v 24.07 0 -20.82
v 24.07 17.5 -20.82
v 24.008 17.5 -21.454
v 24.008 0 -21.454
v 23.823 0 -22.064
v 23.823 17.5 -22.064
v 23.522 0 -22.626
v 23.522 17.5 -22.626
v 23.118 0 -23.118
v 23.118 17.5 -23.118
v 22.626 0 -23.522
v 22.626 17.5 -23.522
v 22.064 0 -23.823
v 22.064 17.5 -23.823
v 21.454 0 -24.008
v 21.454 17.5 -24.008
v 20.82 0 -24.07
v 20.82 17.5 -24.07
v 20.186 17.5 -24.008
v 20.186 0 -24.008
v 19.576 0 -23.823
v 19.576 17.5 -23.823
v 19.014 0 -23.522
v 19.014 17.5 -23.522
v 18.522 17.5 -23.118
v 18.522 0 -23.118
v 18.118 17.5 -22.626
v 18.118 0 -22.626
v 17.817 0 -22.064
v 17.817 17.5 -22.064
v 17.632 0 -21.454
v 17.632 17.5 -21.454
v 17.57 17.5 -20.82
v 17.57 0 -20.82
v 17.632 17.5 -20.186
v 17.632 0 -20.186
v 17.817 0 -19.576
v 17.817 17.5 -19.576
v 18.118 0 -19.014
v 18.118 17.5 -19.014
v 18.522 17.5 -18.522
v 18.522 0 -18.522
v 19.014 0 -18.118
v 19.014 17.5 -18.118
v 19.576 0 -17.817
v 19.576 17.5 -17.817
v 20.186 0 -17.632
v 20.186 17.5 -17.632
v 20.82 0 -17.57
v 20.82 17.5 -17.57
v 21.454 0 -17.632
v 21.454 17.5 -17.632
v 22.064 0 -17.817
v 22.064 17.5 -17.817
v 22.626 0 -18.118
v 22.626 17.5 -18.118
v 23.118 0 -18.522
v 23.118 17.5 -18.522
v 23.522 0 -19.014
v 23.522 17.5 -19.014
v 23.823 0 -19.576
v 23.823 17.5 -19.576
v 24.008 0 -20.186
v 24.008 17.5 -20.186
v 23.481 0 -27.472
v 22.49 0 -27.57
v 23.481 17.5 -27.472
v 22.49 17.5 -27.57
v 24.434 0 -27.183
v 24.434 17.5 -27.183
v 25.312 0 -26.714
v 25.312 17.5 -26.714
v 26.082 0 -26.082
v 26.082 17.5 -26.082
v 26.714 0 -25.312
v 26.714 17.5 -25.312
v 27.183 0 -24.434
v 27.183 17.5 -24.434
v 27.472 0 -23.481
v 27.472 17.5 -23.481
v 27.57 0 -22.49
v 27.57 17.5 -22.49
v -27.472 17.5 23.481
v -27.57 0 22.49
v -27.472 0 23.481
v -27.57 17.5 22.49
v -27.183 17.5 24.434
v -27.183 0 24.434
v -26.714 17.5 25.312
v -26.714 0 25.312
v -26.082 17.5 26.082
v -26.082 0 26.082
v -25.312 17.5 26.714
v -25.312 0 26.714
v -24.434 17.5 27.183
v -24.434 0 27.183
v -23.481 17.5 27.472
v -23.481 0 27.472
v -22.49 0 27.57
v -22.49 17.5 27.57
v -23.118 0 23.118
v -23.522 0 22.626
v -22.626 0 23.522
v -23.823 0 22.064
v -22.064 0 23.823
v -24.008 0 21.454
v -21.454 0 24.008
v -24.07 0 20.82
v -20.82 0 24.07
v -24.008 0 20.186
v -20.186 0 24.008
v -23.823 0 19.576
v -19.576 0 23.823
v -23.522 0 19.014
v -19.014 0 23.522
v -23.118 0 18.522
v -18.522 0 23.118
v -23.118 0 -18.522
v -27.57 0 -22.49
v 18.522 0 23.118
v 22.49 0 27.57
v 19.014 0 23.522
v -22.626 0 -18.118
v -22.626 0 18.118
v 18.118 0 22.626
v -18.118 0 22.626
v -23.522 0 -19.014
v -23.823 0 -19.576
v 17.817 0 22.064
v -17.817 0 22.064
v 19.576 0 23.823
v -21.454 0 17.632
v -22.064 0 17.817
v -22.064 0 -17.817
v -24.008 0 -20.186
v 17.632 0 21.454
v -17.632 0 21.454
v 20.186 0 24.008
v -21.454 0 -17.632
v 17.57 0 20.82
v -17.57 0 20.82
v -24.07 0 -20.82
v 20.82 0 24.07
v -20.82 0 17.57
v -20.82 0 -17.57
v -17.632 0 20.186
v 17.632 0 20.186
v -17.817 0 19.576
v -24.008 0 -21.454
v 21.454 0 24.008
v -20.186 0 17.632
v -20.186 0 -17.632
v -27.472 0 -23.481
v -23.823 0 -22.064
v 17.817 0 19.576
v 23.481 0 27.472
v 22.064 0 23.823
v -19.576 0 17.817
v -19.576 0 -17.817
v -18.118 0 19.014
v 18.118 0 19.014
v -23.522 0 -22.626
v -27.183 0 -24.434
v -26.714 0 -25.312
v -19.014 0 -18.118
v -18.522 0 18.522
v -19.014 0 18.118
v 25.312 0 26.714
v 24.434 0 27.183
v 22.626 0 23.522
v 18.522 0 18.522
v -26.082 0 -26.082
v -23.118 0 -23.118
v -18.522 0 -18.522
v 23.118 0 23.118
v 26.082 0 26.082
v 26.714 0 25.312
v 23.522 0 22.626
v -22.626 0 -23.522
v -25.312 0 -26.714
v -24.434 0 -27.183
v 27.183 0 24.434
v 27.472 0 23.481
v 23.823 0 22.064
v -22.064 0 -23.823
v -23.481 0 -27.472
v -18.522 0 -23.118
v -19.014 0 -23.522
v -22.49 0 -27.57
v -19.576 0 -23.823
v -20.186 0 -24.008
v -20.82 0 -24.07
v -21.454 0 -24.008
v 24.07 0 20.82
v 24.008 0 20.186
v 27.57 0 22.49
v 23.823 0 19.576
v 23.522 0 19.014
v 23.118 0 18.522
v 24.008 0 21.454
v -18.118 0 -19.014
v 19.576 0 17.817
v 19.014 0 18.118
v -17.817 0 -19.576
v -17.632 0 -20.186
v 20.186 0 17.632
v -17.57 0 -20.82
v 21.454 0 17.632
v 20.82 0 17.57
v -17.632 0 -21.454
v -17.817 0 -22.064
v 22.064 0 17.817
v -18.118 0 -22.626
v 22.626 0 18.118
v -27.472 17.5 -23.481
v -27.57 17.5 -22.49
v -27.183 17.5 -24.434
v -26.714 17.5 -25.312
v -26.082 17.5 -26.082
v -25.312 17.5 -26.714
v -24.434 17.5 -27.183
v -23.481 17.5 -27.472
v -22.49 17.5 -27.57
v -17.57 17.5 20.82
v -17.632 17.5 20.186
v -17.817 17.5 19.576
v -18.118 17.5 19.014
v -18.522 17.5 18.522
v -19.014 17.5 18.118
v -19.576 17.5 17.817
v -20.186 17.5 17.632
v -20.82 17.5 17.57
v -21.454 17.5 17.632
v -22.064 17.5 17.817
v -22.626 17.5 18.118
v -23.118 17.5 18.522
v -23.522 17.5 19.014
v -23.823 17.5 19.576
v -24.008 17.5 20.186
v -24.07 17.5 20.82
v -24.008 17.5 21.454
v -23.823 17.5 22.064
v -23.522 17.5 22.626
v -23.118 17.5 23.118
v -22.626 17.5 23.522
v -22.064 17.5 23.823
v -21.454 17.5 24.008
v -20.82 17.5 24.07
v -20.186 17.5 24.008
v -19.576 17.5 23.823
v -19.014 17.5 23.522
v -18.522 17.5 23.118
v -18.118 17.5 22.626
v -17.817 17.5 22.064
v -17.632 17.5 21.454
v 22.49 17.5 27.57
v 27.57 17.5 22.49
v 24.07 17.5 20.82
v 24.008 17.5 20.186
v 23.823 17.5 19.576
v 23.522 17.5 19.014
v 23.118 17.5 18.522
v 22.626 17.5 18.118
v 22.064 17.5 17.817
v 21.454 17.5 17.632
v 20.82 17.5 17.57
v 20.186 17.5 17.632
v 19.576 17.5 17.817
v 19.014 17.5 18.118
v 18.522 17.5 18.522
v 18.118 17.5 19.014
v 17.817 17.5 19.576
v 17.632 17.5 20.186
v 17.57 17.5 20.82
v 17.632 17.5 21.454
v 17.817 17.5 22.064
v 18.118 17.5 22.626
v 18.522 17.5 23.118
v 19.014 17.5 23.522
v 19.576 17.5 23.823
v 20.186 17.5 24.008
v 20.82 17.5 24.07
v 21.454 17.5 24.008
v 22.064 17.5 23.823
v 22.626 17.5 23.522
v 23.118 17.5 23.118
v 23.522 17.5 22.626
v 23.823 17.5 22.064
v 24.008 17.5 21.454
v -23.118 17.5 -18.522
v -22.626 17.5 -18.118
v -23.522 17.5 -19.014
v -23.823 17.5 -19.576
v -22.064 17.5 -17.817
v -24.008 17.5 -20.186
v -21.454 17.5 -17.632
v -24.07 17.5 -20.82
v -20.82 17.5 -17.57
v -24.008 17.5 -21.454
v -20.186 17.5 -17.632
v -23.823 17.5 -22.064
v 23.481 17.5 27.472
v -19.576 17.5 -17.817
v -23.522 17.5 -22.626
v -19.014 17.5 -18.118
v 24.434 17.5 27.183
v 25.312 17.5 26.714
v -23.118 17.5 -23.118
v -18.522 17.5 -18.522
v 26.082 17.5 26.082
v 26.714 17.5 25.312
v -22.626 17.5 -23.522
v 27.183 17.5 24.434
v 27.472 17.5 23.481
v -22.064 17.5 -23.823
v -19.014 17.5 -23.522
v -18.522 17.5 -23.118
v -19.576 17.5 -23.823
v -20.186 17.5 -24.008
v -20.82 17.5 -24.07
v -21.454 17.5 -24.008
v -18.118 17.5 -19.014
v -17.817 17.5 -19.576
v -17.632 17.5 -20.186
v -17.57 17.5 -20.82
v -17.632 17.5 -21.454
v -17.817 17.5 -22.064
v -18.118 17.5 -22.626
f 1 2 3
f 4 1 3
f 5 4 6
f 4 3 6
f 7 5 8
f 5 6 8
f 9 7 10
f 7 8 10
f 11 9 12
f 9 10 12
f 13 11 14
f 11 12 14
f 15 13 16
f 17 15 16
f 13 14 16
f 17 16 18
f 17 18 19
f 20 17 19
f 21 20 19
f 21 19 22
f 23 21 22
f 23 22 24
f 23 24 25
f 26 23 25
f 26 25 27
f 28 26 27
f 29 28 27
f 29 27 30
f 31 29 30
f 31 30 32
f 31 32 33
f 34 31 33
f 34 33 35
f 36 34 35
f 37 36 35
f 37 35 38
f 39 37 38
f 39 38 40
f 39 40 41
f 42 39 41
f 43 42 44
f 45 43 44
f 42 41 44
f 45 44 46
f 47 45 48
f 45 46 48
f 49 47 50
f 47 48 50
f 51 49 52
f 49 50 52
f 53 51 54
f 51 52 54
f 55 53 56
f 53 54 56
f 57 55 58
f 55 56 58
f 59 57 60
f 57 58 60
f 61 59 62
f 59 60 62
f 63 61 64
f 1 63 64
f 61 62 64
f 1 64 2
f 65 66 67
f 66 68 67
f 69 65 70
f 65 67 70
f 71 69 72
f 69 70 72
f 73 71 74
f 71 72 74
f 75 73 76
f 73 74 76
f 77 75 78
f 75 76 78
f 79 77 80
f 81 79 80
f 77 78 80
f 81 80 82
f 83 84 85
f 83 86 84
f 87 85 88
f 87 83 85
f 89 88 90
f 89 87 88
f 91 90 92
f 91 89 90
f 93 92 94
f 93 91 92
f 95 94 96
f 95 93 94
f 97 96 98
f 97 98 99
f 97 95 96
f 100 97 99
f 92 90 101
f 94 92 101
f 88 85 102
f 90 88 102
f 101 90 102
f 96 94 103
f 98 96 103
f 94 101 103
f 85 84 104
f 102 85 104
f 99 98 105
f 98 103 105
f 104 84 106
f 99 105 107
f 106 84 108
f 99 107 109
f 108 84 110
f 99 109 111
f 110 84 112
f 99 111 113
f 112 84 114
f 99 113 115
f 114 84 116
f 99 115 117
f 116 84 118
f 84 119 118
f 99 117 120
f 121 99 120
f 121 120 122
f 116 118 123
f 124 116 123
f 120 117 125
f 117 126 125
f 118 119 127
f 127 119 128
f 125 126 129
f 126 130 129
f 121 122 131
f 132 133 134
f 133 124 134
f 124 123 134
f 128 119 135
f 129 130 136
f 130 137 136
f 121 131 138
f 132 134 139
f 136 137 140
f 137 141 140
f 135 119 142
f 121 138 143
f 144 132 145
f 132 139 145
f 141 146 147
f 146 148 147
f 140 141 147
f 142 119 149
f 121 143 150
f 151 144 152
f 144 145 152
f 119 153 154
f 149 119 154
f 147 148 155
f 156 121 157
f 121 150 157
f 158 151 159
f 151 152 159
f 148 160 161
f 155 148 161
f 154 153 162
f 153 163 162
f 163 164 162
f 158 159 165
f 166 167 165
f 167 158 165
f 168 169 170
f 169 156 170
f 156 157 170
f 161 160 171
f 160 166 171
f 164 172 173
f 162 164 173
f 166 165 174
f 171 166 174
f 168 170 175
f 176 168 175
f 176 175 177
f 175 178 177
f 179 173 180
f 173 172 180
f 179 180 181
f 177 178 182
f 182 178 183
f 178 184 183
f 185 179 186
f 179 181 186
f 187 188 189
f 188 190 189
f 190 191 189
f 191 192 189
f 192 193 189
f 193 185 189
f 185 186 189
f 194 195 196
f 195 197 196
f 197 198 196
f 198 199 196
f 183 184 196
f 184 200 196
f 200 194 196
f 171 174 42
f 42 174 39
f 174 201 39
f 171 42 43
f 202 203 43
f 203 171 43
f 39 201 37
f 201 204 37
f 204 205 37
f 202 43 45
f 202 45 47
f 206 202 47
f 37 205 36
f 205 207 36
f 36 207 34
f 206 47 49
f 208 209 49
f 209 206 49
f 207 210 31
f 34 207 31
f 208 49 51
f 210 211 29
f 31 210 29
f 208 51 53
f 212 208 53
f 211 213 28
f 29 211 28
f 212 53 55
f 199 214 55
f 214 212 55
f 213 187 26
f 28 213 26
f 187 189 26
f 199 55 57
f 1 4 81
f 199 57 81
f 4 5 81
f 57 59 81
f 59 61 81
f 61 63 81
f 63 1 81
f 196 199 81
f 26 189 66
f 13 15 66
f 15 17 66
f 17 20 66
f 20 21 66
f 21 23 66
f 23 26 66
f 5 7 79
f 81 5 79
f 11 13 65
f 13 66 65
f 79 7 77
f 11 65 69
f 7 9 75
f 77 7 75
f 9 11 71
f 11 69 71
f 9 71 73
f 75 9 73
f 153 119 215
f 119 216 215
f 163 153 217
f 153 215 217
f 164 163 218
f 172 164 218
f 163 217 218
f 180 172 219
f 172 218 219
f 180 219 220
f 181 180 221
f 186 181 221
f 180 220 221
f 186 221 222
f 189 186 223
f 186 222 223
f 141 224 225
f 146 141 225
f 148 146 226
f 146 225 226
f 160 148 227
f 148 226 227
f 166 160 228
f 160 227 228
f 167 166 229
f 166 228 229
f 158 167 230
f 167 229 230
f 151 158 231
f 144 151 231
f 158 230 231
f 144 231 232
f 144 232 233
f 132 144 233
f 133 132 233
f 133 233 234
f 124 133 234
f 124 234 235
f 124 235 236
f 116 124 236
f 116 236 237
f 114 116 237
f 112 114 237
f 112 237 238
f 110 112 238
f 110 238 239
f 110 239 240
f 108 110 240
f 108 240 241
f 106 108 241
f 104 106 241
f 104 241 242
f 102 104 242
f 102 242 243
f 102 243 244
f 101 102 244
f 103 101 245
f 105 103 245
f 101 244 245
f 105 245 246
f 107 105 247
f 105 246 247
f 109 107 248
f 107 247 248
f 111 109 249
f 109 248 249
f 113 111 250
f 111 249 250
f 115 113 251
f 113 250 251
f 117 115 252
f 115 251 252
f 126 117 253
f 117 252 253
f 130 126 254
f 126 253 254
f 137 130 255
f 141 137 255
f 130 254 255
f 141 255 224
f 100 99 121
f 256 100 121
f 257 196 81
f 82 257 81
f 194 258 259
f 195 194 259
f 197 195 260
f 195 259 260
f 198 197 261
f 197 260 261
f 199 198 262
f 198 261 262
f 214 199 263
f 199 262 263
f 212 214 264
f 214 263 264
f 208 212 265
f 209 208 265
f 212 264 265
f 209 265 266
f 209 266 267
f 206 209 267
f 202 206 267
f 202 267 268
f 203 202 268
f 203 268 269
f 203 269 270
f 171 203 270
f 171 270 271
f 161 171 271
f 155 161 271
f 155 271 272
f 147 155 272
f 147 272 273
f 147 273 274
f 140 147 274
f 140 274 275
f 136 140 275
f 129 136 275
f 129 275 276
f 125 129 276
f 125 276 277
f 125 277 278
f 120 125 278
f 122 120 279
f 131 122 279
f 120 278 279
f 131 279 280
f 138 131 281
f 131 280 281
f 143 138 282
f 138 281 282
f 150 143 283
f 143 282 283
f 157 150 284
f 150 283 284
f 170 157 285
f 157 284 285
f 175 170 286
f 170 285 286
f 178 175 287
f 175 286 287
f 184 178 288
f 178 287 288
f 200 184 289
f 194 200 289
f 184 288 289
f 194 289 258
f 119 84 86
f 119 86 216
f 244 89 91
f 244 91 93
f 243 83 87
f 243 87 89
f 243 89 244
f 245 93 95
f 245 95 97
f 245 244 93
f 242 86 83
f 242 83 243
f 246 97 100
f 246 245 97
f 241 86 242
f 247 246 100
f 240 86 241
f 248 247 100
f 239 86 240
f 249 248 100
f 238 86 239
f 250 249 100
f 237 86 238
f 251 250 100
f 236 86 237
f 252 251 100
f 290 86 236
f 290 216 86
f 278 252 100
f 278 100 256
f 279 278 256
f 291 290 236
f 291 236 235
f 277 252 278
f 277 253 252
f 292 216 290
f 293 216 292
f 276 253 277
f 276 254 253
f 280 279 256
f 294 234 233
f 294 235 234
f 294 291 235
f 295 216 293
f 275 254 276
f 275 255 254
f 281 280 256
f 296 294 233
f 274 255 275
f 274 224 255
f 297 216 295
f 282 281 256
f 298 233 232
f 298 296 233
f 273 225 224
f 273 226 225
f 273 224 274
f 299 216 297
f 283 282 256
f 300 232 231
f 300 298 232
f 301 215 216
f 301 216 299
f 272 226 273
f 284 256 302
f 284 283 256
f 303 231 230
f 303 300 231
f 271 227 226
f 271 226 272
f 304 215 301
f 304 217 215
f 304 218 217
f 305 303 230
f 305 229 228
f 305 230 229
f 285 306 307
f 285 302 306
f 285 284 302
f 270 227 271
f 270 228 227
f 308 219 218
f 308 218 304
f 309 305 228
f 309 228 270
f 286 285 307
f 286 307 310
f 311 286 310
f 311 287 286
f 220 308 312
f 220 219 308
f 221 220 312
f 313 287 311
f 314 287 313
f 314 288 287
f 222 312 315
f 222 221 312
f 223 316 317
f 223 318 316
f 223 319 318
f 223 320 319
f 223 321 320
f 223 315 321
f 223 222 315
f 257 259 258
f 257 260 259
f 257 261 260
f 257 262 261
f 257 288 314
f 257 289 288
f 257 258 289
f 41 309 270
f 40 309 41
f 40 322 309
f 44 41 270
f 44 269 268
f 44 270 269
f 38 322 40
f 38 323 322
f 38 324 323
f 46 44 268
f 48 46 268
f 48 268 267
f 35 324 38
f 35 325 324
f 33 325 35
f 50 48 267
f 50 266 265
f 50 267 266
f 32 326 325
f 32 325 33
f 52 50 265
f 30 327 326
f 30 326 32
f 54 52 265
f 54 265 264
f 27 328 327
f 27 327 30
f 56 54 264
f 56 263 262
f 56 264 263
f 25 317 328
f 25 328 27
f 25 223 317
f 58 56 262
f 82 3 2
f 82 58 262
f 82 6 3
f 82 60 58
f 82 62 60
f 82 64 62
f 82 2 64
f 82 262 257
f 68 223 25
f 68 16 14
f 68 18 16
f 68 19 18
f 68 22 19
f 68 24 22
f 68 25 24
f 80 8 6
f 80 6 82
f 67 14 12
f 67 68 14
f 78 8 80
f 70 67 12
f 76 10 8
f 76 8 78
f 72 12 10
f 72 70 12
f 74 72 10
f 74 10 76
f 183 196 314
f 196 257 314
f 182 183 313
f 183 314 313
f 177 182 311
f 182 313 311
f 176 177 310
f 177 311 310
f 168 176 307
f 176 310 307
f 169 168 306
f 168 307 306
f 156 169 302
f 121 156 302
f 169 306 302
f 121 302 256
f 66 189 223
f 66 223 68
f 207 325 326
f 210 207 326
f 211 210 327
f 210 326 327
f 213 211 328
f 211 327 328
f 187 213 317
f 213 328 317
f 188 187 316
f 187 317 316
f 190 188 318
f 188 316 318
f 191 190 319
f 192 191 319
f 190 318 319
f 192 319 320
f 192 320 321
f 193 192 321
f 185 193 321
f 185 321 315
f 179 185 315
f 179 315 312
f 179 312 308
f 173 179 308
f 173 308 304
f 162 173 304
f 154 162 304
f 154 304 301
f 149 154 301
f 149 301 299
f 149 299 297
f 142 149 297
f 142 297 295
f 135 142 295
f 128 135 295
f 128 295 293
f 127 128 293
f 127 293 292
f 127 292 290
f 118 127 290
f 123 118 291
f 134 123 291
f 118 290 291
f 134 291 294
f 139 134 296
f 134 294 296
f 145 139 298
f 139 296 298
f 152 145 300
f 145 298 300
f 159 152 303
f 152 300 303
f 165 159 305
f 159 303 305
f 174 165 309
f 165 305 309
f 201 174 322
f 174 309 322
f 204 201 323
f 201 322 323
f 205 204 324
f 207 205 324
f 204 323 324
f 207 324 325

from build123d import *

# Parameters (mm, degrees)
SKETCH1_W               = 55.14
SKETCH1_H               = 55.14
BOSS_EXTRUDE1_DEPTH     = 17.5
SKETCH2_R               = 3.25
CUT_EXTRUDE1_DEPTH      = 50.8
FILLET1_R               = 5.08
SKETCH3_R               = 3.25
CUT_EXTRUDE2_DEPTH      = 1
CUT_EXTRUDE2_DEPTH_BACK = 18.5
FILLET2_R               = 5.08
SKETCH10_R              = 3.25
CUT_EXTRUDE3_DEPTH      = 1
CUT_EXTRUDE3_DEPTH_BACK = 18.5
SKETCH11_R              = 3.25
CUT_EXTRUDE4_DEPTH      = 1
CUT_EXTRUDE4_DEPTH_BACK = 18.5
FILLET3_R               = 5.08


with BuildPart() as part:
    # Sketch1 → Boss-Extrude1 (new body)
    with BuildSketch(Plane(origin=(0, 0, 0), x_dir=(1, 0, 0), z_dir=(0, 1, 0))):
        Rectangle(SKETCH1_W, SKETCH1_H)
    extrude(amount=BOSS_EXTRUDE1_DEPTH)

    # Sketch2 → Cut-Extrude1 (cut)
    with BuildSketch(Plane(origin=(0, 17.5, 0), x_dir=(1, 0, 0), z_dir=(0, 1, 0))):
        with Locations((-20.82, 20.82)):
            Circle(SKETCH2_R)
    extrude(amount=-CUT_EXTRUDE1_DEPTH, mode=Mode.SUBTRACT)

    # Fillet1
    fillet1_edges = [part.edges().sort_by_distance(p)[0] for p in [
        (-27.57, 8.75, -27.57),
    ]]
    fillet(fillet1_edges, radius=FILLET1_R)

    # Sketch3 → Cut-Extrude2 (cut, two sides)
    with BuildSketch(Plane(origin=(0, 17.5, 0), x_dir=(1, 0, 0), z_dir=(0, 1, 0))) as cut_extrude2_sk:
        with Locations((20.82, 20.82)):
            Circle(SKETCH3_R)
    extrude(amount=CUT_EXTRUDE2_DEPTH, mode=Mode.SUBTRACT)
    extrude(cut_extrude2_sk.sketch, amount=-CUT_EXTRUDE2_DEPTH_BACK, mode=Mode.SUBTRACT)

    # Fillet2
    fillet2_edges = [part.edges().sort_by_distance(p)[0] for p in [
        (27.57, 8.75, -27.57),
    ]]
    fillet(fillet2_edges, radius=FILLET2_R)

    # Sketch10 → Cut-Extrude3 (cut, two sides)
    with BuildSketch(Plane(origin=(0, 17.5, 0), x_dir=(1, 0, 0), z_dir=(0, 1, 0))) as cut_extrude3_sk:
        with Locations((-20.82, -20.82)):
            Circle(SKETCH10_R)
    extrude(amount=CUT_EXTRUDE3_DEPTH, mode=Mode.SUBTRACT)
    extrude(cut_extrude3_sk.sketch, amount=-CUT_EXTRUDE3_DEPTH_BACK, mode=Mode.SUBTRACT)

    # Sketch11 → Cut-Extrude4 (cut, two sides)
    with BuildSketch(Plane(origin=(0, 17.5, 0), x_dir=(1, 0, 0), z_dir=(0, 1, 0))) as cut_extrude4_sk:
        with Locations((20.82, -20.82)):
            Circle(SKETCH11_R)
    extrude(amount=CUT_EXTRUDE4_DEPTH, mode=Mode.SUBTRACT)
    extrude(cut_extrude4_sk.sketch, amount=-CUT_EXTRUDE4_DEPTH_BACK, mode=Mode.SUBTRACT)

    # Fillet3
    fillet3_edges = [part.edges().sort_by_distance(p)[0] for p in [
        (27.57, 8.75, 27.57),
        (-27.57, 8.75, 27.57),
    ]]
    fillet(fillet3_edges, radius=FILLET3_R)


solid = part.part
